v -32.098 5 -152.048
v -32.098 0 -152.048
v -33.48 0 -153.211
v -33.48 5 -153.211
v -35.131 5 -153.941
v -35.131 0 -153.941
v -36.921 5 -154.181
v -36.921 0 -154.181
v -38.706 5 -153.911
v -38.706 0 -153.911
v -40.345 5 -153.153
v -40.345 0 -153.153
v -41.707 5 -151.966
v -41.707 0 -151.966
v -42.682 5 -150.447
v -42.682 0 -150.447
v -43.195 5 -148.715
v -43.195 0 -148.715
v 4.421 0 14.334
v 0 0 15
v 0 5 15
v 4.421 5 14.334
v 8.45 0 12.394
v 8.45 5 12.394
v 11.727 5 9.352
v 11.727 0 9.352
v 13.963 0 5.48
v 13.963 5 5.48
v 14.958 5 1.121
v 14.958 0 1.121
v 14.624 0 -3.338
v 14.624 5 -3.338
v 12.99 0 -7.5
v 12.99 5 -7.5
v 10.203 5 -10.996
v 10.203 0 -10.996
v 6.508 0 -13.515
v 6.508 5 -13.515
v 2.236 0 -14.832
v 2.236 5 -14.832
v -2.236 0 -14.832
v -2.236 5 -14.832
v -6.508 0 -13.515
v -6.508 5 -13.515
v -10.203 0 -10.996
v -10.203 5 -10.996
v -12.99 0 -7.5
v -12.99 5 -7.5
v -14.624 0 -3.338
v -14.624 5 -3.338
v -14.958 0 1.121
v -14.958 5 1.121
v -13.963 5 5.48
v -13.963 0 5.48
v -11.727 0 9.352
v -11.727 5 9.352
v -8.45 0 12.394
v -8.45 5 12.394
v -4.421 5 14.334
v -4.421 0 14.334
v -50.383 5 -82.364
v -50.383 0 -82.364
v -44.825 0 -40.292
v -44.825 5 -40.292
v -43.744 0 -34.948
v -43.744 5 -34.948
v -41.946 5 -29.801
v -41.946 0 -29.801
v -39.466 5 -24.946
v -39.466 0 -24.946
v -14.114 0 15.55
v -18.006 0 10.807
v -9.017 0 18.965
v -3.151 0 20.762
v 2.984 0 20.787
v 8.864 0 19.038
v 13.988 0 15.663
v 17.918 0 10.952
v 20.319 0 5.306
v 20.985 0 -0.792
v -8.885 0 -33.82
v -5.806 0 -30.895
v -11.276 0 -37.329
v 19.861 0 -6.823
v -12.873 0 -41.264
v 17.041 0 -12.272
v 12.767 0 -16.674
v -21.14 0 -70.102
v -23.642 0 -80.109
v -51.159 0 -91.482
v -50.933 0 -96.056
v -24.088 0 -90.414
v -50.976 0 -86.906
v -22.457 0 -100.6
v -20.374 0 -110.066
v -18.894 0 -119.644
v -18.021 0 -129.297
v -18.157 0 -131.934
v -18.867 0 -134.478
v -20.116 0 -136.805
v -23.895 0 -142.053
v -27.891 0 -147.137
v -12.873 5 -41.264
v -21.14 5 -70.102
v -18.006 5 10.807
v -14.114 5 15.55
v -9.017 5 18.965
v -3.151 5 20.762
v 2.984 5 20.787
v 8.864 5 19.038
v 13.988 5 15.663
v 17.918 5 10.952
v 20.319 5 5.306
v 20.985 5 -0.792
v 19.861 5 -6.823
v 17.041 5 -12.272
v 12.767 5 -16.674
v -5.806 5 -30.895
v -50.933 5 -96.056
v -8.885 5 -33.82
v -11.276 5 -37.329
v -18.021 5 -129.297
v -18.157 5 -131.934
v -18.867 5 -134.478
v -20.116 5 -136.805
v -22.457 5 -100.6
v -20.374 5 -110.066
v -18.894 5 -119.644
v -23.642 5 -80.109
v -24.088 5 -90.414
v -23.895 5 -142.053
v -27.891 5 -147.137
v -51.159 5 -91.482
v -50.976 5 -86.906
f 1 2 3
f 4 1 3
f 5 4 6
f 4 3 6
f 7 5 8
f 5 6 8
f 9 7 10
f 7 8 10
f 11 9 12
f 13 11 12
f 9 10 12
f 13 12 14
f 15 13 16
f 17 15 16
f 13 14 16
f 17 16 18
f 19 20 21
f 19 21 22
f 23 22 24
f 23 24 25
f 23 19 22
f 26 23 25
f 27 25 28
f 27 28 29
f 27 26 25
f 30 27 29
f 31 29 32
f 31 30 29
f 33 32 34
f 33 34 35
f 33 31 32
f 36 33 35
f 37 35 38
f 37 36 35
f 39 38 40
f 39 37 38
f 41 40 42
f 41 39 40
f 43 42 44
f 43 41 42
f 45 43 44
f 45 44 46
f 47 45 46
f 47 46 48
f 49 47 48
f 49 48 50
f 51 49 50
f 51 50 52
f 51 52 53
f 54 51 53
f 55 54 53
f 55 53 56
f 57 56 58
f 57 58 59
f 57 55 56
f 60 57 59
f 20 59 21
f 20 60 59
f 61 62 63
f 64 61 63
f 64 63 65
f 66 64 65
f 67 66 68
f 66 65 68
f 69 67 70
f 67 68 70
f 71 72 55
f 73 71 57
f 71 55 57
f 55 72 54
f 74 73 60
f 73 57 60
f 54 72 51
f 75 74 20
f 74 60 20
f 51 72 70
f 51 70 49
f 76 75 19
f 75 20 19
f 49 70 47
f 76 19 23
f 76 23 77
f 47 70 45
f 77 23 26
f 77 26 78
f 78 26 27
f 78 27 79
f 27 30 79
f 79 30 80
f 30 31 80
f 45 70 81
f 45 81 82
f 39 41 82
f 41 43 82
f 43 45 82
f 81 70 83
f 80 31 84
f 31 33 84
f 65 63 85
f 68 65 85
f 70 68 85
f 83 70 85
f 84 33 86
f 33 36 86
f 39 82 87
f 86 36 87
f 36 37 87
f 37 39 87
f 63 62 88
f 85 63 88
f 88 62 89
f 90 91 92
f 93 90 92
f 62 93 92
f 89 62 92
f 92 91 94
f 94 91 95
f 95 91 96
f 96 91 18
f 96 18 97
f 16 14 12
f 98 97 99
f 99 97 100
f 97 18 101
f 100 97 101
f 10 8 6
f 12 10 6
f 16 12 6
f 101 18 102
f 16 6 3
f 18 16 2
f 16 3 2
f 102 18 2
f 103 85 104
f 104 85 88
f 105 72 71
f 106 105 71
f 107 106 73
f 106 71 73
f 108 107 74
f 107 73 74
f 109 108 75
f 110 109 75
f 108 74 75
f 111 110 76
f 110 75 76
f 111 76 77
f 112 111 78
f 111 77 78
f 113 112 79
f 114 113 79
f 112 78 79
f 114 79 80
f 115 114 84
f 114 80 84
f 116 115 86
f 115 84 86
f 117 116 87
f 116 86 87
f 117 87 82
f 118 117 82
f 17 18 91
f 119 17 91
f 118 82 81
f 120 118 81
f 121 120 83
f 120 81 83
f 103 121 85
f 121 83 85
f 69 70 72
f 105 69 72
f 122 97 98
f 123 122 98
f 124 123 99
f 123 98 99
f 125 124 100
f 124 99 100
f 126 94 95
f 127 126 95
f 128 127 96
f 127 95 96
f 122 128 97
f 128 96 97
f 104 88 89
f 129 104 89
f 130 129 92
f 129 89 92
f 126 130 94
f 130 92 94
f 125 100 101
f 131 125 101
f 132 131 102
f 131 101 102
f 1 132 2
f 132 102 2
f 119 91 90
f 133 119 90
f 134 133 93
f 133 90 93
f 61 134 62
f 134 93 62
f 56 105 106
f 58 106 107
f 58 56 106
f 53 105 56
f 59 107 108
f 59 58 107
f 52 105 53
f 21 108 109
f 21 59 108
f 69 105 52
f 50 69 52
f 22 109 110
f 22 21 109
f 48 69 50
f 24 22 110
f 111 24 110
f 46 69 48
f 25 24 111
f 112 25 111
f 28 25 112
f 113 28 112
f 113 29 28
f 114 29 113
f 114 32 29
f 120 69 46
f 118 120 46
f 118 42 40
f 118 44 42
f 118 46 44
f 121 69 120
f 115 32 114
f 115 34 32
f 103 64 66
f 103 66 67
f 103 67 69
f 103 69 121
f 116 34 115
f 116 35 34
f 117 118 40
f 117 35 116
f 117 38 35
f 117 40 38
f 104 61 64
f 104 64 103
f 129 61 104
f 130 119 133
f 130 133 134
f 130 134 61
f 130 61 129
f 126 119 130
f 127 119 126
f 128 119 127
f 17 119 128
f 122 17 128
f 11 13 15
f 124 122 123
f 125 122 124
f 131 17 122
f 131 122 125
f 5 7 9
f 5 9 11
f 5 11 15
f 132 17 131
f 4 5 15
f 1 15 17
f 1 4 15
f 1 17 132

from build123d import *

# Parameters (mm, degrees)
SKETCH1_R           = 15
BOSS_EXTRUDE2_DEPTH = 5


with BuildPart() as part:
    # Sketch1 → Boss-Extrude2 (new body)
    with BuildSketch(Plane(origin=(0, 0, 0), x_dir=(1, 0, 0), z_dir=(0, 1, 0))):
        with BuildLine():
            Line((12.766893669, 16.673524704), (-5.806288098, 30.894983029))
            ThreePointArc((-5.806288098, 30.894983029), (-10.173884932, 35.51072238), (-12.873087905, 41.263569952))
            Line((-12.873087905, 41.263569952), (-21.139528525, 70.102189189))
            ThreePointArc((-21.139528525, 70.102189189), (-24.1253581, 85.250444887), (-22.456551163, 100.599709115))
            ThreePointArc((-22.456551163, 100.599709115), (-19.558480324, 114.843106453), (-18.020623668, 129.29676271))
            ThreePointArc((-18.020623668, 129.29676271), (-18.441772746, 133.226047543), (-20.116399197, 136.805470974))
            ThreePointArc((-20.116399197, 136.805470974), (-25.866377757, 144.615905974), (-32.098124488, 152.047627243))
            ThreePointArc((-32.098124488, 152.047627243), (-38.706331156, 153.910886754), (-43.194615771, 148.715173848))
            Line((-43.194615771, 148.715173848), (-50.932711484, 96.056215067))
            ThreePointArc((-50.932711484, 96.056215067), (-51.118515181, 89.191813761), (-50.383474997, 82.364351257))
            Line((-50.383474997, 82.364351257), (-44.824882263, 40.292034954))
            ThreePointArc((-44.824882263, 40.292034954), (-42.933064202, 32.343713579), (-39.465684055, 24.945601445))
            Line((-39.465684055, 24.945601445), (-18.005501401, -10.807493664))
            ThreePointArc((-18.005501401, -10.807493664), (13.987935708, -15.66325811), (12.766893669, 16.673524704))
        make_face()
        with Locations(Location((0, 0, 0), (0, 0, 270))):
            Circle(SKETCH1_R, mode=Mode.SUBTRACT)
    extrude(amount=BOSS_EXTRUDE2_DEPTH)


solid = part.part
